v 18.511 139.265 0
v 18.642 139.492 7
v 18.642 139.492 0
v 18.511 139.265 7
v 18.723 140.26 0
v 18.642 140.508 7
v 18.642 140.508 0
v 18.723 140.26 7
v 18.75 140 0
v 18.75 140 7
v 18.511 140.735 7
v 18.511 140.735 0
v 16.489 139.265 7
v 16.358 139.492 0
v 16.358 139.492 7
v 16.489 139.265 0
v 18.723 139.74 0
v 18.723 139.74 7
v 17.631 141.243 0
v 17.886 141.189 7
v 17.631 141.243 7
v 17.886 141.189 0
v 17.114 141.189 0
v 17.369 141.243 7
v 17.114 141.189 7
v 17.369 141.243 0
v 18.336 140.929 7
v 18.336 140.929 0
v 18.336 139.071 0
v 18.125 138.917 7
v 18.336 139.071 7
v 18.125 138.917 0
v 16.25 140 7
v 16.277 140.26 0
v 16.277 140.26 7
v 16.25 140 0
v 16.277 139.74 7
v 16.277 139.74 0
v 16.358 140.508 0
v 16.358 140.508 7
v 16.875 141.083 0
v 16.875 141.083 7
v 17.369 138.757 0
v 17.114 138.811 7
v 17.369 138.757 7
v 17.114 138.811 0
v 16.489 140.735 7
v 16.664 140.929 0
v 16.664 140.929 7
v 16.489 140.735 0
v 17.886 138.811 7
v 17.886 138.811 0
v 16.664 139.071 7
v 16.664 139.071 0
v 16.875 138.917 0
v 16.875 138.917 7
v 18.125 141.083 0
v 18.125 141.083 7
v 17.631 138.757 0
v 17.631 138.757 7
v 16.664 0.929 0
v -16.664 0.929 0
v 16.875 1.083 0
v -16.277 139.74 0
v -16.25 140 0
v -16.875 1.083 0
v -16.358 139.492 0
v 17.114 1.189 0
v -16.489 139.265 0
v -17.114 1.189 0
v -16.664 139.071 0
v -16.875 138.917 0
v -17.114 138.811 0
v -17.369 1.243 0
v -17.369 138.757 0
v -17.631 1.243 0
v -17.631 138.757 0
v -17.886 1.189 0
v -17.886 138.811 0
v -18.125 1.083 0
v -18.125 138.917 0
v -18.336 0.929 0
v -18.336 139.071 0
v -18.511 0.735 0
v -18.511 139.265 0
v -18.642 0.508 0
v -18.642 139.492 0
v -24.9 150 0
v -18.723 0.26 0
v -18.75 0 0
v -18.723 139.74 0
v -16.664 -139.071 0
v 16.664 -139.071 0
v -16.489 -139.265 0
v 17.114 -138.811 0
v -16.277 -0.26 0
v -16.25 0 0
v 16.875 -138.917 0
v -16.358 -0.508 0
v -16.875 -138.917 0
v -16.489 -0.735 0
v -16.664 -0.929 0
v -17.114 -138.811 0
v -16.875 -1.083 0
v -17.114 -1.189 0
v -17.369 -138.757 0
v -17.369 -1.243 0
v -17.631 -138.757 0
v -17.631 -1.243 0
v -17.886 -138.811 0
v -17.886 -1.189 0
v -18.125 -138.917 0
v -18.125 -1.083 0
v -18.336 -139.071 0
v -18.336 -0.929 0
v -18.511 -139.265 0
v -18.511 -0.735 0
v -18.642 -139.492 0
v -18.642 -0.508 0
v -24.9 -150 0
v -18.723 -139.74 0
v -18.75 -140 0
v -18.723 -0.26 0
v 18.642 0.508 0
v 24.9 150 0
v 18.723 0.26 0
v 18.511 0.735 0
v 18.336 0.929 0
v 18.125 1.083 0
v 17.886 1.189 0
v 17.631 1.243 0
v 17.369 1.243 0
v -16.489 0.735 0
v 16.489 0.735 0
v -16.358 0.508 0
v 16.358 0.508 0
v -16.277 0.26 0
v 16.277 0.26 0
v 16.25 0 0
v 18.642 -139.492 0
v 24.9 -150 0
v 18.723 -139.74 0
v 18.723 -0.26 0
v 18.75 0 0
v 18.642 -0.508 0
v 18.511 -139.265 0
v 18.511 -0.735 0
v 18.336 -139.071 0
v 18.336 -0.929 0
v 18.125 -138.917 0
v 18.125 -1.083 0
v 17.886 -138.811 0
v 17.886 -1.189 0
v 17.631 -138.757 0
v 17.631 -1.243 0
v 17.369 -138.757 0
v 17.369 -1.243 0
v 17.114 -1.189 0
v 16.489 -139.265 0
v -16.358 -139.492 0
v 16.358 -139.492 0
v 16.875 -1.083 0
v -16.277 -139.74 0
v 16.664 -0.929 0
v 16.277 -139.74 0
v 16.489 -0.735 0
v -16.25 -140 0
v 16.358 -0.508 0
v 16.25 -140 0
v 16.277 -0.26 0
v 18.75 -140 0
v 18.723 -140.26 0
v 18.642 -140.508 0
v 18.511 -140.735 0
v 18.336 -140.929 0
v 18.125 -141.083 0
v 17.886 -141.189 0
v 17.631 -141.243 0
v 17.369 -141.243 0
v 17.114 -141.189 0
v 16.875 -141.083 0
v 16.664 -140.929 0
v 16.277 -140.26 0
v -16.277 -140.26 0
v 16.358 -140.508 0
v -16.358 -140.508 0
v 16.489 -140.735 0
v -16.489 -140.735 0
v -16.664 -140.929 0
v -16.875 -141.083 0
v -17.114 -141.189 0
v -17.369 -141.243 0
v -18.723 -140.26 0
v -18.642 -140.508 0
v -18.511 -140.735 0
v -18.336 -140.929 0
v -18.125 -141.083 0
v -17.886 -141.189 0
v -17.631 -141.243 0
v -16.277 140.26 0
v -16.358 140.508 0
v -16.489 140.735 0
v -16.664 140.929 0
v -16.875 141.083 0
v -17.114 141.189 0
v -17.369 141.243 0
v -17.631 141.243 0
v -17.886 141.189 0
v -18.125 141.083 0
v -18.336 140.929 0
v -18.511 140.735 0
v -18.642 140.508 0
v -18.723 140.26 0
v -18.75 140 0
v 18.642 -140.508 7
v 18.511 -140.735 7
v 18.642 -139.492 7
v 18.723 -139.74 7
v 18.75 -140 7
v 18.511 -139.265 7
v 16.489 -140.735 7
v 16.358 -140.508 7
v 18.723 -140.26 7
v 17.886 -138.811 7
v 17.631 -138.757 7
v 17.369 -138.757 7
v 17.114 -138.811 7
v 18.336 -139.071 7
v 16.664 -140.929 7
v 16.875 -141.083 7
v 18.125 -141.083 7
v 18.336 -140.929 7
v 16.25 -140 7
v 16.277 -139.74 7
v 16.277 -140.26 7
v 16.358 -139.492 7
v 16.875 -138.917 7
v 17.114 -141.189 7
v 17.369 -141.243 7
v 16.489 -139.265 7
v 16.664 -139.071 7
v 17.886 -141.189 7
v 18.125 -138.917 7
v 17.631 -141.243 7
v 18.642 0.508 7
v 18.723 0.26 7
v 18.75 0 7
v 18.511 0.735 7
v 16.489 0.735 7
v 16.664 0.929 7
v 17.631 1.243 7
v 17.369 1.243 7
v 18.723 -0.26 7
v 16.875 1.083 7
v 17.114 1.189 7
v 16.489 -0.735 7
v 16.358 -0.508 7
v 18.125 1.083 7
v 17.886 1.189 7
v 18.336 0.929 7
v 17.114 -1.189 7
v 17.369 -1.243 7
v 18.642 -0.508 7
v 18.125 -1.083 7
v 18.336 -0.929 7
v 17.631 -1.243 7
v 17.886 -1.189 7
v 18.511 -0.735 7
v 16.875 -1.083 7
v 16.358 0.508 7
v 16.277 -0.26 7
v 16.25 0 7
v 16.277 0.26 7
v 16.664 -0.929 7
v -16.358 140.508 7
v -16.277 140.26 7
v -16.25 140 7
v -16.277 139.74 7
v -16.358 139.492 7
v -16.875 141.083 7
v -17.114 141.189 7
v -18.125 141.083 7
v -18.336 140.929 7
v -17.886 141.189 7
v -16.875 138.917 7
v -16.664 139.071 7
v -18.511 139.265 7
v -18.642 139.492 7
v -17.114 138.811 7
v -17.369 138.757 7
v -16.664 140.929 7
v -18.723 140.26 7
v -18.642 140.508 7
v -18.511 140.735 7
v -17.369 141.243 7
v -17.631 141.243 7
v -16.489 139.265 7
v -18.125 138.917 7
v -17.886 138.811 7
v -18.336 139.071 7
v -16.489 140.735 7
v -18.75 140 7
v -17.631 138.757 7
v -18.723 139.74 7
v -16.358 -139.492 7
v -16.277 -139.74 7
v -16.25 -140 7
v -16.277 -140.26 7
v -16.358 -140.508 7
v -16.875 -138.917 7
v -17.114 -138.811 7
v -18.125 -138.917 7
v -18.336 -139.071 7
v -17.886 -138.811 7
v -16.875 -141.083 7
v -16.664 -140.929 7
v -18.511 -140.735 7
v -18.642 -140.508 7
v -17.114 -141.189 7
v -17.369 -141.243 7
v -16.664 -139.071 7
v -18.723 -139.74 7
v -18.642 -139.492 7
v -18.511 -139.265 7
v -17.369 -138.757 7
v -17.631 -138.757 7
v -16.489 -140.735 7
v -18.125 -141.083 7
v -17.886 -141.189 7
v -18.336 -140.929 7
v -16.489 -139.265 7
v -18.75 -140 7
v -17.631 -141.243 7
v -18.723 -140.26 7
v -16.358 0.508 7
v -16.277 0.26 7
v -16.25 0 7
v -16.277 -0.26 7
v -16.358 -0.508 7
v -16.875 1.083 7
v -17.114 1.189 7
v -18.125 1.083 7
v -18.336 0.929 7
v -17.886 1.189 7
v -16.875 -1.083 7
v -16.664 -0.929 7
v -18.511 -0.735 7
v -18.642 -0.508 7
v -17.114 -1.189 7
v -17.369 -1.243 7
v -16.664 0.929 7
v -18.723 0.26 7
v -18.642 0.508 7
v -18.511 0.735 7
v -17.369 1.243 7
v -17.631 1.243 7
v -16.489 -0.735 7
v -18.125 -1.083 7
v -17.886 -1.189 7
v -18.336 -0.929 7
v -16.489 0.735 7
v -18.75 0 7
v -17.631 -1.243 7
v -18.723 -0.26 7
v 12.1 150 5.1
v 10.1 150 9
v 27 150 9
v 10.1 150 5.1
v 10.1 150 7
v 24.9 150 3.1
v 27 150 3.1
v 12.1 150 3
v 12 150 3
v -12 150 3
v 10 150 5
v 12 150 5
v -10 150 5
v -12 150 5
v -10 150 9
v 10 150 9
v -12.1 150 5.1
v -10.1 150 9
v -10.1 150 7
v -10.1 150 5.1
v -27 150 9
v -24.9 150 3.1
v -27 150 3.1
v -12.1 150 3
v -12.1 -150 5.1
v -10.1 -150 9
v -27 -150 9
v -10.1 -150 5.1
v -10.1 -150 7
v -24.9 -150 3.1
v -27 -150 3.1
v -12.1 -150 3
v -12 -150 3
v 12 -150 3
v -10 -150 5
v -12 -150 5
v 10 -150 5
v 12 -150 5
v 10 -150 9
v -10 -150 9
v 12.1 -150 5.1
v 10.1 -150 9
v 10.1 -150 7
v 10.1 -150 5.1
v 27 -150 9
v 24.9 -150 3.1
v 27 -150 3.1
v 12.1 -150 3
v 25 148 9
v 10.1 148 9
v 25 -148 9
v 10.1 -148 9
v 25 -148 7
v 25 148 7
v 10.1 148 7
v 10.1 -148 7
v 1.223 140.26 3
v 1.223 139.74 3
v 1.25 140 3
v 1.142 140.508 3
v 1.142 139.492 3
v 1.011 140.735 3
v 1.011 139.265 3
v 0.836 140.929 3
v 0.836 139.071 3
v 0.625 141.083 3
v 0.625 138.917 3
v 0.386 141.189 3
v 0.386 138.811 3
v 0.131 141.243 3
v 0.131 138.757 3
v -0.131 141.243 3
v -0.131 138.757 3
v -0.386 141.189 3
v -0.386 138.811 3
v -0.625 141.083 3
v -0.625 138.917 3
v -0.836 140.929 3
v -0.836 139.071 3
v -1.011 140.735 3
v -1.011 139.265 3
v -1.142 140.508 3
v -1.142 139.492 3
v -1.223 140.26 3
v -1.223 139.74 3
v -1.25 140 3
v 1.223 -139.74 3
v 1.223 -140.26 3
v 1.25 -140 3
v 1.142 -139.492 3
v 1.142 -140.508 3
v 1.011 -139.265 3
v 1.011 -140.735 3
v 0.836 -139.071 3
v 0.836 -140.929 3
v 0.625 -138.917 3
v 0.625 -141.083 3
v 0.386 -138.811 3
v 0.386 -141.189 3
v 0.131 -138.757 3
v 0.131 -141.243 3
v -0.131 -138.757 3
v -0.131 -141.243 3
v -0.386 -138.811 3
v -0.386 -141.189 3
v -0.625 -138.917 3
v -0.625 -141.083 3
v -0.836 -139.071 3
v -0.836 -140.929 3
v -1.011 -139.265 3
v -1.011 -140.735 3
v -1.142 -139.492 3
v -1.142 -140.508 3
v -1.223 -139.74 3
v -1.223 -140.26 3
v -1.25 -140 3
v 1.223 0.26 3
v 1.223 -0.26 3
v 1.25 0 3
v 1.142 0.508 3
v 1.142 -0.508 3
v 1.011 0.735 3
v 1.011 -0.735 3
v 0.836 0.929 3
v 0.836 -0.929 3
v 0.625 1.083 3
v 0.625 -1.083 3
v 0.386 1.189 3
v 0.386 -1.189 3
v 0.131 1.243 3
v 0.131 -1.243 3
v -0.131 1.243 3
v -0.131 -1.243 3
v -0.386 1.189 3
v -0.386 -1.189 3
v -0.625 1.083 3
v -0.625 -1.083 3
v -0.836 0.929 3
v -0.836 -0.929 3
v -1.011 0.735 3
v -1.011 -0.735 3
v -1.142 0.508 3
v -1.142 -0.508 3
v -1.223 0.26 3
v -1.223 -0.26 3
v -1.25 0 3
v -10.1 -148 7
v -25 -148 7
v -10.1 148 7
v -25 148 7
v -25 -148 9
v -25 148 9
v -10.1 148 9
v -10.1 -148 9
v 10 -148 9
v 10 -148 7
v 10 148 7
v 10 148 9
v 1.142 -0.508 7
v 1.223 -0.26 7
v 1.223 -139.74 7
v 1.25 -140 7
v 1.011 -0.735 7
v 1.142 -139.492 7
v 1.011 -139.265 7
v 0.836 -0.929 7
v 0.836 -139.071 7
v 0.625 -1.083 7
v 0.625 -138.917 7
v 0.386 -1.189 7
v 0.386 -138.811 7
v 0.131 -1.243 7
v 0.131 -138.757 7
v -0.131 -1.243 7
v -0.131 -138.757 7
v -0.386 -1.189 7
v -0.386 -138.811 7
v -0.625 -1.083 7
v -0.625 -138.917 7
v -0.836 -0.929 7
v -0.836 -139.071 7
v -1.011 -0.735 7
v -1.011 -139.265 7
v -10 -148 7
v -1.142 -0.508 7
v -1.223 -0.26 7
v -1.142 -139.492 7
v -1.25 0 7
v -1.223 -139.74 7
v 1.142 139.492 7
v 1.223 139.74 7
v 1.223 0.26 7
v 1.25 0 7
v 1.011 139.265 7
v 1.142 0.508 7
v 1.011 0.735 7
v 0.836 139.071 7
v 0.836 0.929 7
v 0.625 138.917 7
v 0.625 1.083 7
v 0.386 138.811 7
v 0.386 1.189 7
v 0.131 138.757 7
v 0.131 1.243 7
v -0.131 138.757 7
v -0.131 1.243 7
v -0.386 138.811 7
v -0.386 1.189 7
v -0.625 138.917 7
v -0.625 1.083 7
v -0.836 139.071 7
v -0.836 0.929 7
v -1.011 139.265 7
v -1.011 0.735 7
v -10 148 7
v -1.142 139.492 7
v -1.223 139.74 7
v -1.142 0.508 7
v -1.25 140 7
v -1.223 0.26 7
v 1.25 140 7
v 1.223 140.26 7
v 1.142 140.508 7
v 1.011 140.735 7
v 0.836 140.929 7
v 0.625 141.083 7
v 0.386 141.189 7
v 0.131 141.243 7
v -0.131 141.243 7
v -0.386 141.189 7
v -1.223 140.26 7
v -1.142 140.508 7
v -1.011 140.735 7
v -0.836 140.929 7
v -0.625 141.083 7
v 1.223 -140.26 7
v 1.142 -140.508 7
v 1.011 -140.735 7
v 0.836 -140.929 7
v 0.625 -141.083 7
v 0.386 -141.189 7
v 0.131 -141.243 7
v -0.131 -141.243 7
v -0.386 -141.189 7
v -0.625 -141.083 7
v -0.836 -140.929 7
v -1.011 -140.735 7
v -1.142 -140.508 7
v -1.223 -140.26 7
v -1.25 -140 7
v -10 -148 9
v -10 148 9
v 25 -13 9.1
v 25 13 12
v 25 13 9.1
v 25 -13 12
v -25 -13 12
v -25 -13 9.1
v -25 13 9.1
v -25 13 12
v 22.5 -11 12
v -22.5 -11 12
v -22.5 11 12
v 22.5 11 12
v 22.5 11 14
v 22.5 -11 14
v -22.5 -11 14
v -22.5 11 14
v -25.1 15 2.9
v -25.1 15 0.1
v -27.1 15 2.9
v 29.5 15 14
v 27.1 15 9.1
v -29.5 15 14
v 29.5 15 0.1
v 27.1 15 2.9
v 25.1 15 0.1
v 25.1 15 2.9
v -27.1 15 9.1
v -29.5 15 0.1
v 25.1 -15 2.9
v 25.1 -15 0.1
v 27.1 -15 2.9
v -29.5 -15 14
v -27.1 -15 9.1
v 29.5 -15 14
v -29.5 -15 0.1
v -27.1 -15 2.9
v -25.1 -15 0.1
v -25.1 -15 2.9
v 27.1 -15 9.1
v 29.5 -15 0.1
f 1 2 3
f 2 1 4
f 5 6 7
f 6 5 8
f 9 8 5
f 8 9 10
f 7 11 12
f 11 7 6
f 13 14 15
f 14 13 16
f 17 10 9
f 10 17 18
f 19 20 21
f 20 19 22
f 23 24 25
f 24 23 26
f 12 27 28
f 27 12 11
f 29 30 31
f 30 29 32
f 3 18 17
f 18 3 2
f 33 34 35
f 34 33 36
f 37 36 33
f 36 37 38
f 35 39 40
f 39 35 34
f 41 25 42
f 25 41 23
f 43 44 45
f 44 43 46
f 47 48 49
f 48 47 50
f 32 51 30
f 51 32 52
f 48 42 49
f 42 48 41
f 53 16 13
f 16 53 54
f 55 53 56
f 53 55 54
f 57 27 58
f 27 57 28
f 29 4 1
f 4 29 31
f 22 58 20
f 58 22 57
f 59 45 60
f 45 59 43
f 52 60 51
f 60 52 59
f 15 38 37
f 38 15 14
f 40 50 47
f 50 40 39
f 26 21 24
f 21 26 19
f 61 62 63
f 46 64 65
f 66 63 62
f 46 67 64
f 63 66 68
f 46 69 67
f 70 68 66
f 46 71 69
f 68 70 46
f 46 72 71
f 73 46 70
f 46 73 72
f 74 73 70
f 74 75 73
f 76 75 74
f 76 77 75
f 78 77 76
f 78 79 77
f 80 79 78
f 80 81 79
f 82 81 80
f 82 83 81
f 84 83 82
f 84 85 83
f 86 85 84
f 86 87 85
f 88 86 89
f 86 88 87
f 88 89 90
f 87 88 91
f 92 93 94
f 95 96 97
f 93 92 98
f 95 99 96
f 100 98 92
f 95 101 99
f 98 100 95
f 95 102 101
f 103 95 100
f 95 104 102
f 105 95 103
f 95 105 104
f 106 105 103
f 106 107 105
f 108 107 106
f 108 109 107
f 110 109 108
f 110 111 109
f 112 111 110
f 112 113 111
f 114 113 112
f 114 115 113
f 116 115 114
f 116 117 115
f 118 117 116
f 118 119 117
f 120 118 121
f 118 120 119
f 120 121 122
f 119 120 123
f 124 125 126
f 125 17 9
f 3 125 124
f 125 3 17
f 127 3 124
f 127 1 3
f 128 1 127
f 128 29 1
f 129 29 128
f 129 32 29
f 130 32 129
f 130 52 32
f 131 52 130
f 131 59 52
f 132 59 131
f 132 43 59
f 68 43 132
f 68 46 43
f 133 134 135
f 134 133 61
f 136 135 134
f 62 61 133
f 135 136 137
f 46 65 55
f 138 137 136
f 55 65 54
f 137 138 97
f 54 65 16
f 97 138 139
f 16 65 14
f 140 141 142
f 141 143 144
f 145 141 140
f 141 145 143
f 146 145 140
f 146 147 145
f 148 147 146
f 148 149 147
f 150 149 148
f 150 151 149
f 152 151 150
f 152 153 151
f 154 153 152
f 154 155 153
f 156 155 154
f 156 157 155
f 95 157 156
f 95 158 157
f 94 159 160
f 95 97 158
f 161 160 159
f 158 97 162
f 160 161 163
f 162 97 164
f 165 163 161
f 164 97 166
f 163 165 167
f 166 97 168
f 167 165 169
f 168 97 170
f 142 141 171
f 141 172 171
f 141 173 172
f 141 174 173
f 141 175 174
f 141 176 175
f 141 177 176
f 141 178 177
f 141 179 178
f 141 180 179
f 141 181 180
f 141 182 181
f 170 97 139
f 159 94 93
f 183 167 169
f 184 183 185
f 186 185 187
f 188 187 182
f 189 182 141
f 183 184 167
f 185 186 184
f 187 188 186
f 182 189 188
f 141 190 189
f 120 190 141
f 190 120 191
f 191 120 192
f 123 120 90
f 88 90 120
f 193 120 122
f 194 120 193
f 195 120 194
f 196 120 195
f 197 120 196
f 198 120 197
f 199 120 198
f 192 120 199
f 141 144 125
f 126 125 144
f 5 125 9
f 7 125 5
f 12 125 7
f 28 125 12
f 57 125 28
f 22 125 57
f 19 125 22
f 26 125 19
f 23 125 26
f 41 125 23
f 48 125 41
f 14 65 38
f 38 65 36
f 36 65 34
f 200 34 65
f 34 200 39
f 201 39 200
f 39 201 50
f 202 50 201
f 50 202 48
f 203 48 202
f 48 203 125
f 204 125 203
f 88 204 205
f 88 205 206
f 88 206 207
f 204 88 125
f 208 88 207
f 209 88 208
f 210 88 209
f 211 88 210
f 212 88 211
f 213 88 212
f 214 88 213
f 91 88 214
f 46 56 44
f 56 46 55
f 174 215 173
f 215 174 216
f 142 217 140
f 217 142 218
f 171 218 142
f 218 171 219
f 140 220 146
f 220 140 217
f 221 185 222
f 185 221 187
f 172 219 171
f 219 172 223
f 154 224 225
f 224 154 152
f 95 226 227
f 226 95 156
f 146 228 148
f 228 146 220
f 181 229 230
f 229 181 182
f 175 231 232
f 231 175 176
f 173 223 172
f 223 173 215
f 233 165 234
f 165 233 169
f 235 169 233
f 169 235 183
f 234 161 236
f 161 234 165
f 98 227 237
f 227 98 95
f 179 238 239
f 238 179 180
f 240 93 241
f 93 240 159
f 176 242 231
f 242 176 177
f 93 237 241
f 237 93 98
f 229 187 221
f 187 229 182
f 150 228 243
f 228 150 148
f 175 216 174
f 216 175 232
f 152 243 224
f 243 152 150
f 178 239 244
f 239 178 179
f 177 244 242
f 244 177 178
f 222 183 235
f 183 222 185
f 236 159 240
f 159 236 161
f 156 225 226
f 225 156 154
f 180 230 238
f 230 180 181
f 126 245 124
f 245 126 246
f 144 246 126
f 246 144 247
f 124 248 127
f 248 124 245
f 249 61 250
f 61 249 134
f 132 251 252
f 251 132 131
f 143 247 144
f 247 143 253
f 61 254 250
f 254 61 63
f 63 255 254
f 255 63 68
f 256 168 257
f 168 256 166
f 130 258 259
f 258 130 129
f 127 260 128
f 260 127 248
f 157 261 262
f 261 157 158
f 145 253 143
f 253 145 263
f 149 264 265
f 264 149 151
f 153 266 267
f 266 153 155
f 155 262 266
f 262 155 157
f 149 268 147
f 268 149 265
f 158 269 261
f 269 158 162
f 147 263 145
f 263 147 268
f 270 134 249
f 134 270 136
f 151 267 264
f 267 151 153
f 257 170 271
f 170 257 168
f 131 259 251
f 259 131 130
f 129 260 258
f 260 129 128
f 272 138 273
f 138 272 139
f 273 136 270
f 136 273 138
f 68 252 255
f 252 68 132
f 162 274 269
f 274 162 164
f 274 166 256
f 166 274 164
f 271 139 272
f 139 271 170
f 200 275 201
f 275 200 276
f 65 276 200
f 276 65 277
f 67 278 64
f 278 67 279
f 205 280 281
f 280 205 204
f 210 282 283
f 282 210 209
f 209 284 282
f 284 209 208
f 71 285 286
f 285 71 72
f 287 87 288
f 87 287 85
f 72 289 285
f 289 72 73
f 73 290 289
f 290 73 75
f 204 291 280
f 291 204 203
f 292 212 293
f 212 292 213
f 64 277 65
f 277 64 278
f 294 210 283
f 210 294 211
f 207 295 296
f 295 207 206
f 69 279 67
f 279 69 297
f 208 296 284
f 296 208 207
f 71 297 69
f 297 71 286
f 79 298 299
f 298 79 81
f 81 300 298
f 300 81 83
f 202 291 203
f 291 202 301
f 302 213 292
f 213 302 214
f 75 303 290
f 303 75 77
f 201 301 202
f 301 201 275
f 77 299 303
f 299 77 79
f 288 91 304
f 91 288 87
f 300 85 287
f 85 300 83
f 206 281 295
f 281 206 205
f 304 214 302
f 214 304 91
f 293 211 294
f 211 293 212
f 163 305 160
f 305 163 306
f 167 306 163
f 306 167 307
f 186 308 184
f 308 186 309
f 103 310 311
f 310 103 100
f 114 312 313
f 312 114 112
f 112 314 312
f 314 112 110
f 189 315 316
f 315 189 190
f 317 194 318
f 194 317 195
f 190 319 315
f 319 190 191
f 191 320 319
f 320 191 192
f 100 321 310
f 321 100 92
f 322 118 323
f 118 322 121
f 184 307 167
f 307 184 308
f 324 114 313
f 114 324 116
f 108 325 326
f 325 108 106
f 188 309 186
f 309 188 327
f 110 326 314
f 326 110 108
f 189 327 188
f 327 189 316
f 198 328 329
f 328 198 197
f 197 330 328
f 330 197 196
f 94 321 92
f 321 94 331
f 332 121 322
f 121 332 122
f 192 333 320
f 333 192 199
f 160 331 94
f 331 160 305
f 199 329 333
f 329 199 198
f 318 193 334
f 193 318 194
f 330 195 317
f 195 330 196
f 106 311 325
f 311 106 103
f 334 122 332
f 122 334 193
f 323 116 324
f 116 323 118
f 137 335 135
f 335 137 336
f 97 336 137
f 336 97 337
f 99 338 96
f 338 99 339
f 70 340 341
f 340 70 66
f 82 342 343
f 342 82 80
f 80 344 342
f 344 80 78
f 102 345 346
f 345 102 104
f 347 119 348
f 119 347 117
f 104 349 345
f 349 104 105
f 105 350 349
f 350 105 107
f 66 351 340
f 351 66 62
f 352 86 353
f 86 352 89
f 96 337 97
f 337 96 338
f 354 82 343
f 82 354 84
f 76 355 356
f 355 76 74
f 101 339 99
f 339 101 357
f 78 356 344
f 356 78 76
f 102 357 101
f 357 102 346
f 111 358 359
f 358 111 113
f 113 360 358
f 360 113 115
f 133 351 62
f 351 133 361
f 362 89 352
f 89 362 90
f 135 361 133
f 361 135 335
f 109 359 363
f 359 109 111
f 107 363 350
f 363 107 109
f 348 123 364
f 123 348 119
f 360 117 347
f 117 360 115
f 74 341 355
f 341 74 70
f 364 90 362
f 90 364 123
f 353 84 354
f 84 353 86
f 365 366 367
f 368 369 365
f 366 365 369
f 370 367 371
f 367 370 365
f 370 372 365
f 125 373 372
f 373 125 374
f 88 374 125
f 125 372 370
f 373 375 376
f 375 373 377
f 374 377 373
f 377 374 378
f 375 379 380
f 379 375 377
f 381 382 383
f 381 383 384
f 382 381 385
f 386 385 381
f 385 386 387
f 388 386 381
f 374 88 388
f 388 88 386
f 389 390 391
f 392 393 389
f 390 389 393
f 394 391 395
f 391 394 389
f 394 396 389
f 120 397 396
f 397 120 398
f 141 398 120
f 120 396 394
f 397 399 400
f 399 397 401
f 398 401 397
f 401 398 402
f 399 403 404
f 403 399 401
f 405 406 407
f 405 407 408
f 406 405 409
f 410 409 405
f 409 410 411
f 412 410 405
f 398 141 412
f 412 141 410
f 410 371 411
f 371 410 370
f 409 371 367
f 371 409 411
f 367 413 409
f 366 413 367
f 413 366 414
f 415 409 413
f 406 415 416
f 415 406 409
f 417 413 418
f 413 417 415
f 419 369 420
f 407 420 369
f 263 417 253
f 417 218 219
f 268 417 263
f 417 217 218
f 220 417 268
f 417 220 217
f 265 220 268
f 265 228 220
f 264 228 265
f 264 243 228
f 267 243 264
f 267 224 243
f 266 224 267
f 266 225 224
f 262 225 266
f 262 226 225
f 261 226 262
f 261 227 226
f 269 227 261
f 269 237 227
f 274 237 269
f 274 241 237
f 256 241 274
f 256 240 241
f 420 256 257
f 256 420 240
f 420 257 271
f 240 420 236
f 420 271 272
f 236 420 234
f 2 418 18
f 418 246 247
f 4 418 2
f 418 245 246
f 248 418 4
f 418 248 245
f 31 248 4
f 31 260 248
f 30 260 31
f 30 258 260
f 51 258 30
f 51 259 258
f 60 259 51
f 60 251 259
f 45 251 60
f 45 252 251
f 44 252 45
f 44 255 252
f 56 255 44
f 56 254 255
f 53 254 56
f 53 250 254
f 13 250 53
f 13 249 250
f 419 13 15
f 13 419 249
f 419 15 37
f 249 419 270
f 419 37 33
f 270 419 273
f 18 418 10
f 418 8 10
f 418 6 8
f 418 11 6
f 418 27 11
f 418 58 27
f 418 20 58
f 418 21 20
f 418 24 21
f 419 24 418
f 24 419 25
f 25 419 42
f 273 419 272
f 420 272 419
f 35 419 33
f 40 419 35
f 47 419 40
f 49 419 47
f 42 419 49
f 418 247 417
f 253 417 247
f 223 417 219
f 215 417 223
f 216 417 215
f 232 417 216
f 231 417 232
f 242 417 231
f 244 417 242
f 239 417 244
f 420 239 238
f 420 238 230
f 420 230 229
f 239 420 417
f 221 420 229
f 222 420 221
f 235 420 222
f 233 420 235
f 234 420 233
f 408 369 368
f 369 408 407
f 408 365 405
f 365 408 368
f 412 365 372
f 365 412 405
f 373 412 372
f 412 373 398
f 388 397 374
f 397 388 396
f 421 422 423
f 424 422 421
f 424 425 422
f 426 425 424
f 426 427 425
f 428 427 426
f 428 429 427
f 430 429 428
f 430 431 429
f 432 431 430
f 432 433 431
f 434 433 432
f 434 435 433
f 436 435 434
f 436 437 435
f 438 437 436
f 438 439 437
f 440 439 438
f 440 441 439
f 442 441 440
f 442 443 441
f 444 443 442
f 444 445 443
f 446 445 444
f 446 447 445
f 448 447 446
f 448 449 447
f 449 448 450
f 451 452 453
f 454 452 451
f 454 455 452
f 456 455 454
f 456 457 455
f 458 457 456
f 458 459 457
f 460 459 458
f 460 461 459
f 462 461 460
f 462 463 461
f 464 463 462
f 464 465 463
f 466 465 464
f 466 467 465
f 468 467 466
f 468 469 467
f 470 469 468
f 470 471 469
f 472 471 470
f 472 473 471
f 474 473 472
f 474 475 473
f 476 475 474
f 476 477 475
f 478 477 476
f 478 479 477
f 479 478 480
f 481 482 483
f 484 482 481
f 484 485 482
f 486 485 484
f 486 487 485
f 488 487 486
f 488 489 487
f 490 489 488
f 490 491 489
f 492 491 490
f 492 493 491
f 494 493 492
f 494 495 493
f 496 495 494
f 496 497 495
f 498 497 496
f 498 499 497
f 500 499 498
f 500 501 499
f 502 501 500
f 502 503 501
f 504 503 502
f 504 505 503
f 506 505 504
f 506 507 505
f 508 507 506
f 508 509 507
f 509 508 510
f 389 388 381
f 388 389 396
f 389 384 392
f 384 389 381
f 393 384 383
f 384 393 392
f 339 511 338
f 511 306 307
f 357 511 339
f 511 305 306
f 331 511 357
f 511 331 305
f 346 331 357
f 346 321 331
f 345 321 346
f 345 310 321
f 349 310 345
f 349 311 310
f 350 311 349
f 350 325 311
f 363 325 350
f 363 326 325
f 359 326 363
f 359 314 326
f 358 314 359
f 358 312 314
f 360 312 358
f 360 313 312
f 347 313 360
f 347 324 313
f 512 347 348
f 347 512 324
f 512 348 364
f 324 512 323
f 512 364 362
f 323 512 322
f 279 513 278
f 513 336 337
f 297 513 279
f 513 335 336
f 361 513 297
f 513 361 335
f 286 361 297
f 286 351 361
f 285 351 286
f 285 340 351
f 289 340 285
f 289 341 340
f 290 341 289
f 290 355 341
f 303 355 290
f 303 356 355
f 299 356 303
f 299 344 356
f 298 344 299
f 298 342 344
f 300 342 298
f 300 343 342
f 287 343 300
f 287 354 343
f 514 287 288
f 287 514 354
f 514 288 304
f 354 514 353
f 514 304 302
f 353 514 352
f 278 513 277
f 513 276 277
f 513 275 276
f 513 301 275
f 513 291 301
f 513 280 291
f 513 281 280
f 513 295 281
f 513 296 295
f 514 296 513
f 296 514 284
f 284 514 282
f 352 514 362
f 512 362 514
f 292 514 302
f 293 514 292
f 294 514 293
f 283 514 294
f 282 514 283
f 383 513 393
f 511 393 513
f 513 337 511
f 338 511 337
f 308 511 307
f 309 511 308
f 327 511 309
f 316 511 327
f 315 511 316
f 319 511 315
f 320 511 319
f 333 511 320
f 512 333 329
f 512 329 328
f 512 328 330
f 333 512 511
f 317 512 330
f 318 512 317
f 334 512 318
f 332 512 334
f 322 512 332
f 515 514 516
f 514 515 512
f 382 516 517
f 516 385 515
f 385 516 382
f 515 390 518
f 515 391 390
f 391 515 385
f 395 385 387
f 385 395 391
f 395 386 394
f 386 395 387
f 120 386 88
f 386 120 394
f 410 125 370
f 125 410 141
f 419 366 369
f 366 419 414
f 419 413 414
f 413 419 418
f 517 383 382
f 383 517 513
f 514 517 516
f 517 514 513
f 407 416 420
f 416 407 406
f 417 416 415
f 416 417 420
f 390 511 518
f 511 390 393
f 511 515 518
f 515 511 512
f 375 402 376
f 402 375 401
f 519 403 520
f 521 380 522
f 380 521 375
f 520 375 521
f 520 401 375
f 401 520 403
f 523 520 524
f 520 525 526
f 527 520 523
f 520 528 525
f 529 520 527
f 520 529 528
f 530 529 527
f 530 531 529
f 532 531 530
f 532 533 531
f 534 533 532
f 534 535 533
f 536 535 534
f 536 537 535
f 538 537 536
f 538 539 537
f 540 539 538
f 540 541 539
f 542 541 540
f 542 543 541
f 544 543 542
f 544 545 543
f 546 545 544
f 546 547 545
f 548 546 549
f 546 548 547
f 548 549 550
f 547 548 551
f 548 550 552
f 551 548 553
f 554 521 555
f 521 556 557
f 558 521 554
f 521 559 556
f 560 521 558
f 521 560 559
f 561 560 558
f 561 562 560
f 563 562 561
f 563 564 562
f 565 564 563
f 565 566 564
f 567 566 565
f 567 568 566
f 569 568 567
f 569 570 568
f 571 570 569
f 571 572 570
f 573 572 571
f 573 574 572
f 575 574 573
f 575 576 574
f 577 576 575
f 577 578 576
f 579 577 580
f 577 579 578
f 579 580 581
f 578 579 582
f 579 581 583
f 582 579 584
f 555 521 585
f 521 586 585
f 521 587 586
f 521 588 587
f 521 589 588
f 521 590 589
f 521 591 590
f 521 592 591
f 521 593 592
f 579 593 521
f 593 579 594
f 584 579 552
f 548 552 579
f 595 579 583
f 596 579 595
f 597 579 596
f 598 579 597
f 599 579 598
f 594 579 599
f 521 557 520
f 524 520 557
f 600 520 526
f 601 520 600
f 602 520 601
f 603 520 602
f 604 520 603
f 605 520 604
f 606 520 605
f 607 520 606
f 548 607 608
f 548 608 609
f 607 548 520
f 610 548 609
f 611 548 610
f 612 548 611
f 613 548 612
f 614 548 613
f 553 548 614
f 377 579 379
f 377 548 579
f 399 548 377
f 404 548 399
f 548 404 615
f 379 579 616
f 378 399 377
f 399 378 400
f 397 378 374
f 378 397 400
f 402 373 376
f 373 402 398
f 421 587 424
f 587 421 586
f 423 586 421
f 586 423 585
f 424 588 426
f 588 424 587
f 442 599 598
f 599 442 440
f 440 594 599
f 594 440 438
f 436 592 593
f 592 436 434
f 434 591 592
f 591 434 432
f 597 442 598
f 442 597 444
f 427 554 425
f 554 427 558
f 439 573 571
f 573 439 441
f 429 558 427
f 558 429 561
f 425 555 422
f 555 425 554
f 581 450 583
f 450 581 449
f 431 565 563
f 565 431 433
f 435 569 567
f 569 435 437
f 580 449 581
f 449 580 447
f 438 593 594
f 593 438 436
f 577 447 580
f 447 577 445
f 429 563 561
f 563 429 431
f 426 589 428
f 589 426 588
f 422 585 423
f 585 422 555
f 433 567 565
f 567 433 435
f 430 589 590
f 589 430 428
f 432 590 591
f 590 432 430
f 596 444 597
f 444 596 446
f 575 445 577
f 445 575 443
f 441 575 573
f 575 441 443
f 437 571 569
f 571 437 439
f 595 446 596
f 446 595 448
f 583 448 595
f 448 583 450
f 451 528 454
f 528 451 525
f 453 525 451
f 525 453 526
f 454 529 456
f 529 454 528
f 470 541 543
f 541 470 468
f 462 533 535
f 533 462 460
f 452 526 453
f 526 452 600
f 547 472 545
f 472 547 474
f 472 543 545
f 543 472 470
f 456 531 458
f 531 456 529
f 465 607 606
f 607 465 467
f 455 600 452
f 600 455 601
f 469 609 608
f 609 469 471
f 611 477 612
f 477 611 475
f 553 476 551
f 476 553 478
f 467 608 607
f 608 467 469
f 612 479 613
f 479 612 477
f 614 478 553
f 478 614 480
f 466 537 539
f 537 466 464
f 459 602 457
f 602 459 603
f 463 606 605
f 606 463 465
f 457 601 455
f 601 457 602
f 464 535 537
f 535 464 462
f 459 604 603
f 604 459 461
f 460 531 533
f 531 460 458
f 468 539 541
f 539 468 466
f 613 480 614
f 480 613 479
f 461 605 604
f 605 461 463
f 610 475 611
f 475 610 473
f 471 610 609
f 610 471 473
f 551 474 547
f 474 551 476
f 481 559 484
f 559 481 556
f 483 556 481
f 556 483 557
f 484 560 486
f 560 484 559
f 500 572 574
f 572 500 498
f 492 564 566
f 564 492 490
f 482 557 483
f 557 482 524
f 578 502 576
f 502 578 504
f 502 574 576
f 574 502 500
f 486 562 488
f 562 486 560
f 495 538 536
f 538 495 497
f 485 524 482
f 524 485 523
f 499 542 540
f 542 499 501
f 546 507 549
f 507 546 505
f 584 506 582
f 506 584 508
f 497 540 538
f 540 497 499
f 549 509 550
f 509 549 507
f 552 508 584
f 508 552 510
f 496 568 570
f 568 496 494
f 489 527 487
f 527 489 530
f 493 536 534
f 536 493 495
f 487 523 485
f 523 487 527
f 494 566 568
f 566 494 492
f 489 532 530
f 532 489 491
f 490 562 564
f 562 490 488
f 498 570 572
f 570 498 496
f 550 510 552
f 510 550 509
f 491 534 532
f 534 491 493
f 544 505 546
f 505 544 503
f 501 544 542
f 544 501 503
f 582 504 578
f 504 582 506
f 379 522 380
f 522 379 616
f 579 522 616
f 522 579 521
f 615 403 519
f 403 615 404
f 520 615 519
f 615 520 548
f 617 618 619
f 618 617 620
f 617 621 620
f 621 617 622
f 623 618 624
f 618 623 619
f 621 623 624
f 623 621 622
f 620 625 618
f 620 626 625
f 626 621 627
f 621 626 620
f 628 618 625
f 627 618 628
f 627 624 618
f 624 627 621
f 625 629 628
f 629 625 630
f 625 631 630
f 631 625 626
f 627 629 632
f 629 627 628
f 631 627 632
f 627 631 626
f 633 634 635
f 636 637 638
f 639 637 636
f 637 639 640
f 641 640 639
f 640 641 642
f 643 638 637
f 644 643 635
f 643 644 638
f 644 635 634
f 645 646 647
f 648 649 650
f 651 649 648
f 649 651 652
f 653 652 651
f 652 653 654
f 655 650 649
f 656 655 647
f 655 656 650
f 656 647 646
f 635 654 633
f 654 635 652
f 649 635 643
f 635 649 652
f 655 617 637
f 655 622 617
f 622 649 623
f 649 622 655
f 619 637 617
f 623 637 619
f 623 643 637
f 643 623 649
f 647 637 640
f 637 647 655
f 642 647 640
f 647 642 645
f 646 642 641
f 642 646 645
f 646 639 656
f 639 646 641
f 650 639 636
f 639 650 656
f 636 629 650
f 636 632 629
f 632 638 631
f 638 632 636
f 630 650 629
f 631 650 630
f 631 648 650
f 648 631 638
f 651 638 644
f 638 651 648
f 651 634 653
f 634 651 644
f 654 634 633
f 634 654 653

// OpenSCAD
$fn = 30;

body_thickness = 7;
rule_thickness = 4;
label_thickness = 2;
rule_width = 20;
body_label_width = 15;
length = 300;
window_claw_h = 3;
window_claw_w = 2;
key_len = 2;
key_width = 2;
tol = 0.1;
window_height = body_thickness + key_len + 5;
window_width = body_label_width * 2 + key_len * 2 + rule_width + 5;
window_length = 30;
transparent_window_width = body_label_width * 2 + rule_width;
transparent_window_len = window_length - 4;
transparent_window_thickness = 3;
transparent_window_width1 = body_label_width * 2 + rule_width - 5;
transparent_window_len1 = window_length - 4 - 4;
screw_hole_end_sep = 10;

module body()
{
	difference()
	{
		rotate([ 90, 0, 0 ])
		translate([ 0, 0, -length / 2 ])
		{
			linear_extrude(length)
			{
				polygon(points = [

					[ rule_width / 2 + key_len + tol, body_thickness - rule_thickness ],
					[ rule_width / 2 + key_len + tol, body_thickness - rule_thickness + key_width + tol ],        // 7
					[ rule_width / 2 + tol, body_thickness - rule_thickness + key_width + tol ],                  // 6
					[ rule_width / 2 + tol, body_thickness ],                                                     // 5
					[ rule_width / 2 + body_label_width, body_thickness ],                                        // 4
					[ rule_width / 2 + body_label_width, body_thickness + label_thickness ],                      // 3
					[ rule_width / 2 + body_label_width + key_width, body_thickness + label_thickness ],          // 2
					[ rule_width / 2 + body_label_width + key_width, window_claw_h + tol ],                       // 1
					[ rule_width / 2 + body_label_width + key_width - window_claw_w - tol, window_claw_h + tol ], // 1
					[ rule_width / 2 + body_label_width + key_width - window_claw_w - tol, 0 ],                   // 1

					[ -rule_width / 2 - body_label_width - key_width + window_claw_w + tol, 0 ],                   // 1
					[ -rule_width / 2 - body_label_width - key_width + window_claw_w + tol, window_claw_h + tol ], // 1
					[ -rule_width / 2 - body_label_width - key_width, window_claw_h + tol ],                       // 1
					[ -rule_width / 2 - body_label_width - key_width, body_thickness + label_thickness ],          // 2
					[ -rule_width / 2 - body_label_width, body_thickness + label_thickness ],                      // 3
					[ -rule_width / 2 - body_label_width, body_thickness ],                                        // 4
					[ -rule_width / 2 - tol, body_thickness ],                                                     // 5
					[ -rule_width / 2 - tol, body_thickness - rule_thickness + key_width + tol ],                  // 6
					[ -rule_width / 2 - tol - key_len, body_thickness - rule_thickness + key_width + tol ],        // 7
					[ -rule_width / 2 - tol - key_len, body_thickness - rule_thickness ],                          // 8
				]);
			}
		}
		for (x = [ rule_width/2+body_label_width/2, -rule_width/2-body_label_width/2 ])
		{
			translate([ x, length / 2 - screw_hole_end_sep, 0 ])
			cylinder(h = body_thickness + tol, d = 2.5);
			translate([ x, -(length / 2 - screw_hole_end_sep), 0 ])
			cylinder(h = body_thickness + tol, d = 2.5);
			translate([ x, 0, 0 ])
			cylinder(h = body_thickness + tol, d = 2.5);
		}
	}

	translate([rule_width/2+tol,length/2-label_thickness,body_thickness])
	cube([body_label_width,key_width, label_thickness]);

	translate([-rule_width/2-body_label_width-tol,length/2-label_thickness,body_thickness])
	cube([body_label_width,key_width, label_thickness]);

	translate([rule_width/2+tol,-length/2-label_thickness+key_width,body_thickness])
	cube([body_label_width,key_width, label_thickness]);

	translate([-rule_width/2-body_label_width-tol,-length/2-label_thickness+key_width,body_thickness])
	cube([body_label_width,key_width, label_thickness]);
}

module rule()
{
	difference()
	{
		rotate([ 90, 0, 0 ])
		translate([ 0, 0, -length / 2 ])
		{

			linear_extrude(length)
			{
				polygon(points = [
					[ 0, body_thickness ], [ rule_width / 2, body_thickness ],                    // 4
					[ rule_width / 2, body_thickness - rule_thickness + key_width ],              // 3
					[ rule_width / 2 + key_len, body_thickness - rule_thickness + key_width ],    // 2
					[ rule_width / 2 + key_len, body_thickness - rule_thickness ],                // 1
					[ -(rule_width / 2 + key_len), body_thickness - rule_thickness ],             // 1
					[ -(rule_width / 2 + key_len), body_thickness - rule_thickness + key_width ], // 2
					[ -(rule_width / 2), body_thickness - rule_thickness + key_width ],           // 3
					[ -rule_width / 2, body_thickness ],                                          // 4
				]);
			}
		}
		translate([ 0, length / 2 - screw_hole_end_sep, 0 ])
		cylinder(h = body_thickness + tol, d = 2.5);
		translate([ 0, -(length / 2 - screw_hole_end_sep), 0 ])
		cylinder(h = body_thickness + tol, d = 2.5);
		translate([ 0, 0, 0 ])
		cylinder(h = body_thickness + tol, d = 2.5);
	}
	translate([-rule_width/2,length/2-key_width, body_thickness])
	#cube([rule_width,key_width, label_thickness]);

	translate([-rule_width/2,-length/2, body_thickness])
	cube([rule_width,key_width, label_thickness]);
}

module window()
{
	rotate([ 90, 0, 0 ])
	difference()
	{
		translate([ 0, 0, -window_length / 2 ])
		{
			linear_extrude(window_length)
			{
				polygon(points = [
					//[0,body_thickness+key_len+tol],
					[ rule_width / 2 + body_label_width + key_width + tol, body_thickness + key_len + tol ],      // 6
					[ rule_width / 2 + body_label_width + key_width + tol, window_claw_h - tol ],                 // 5
					[ rule_width / 2 + body_label_width + key_width - window_claw_w + tol, window_claw_h - tol ], // 4
					[ rule_width / 2 + body_label_width + key_width - window_claw_w + tol, tol ],                 // 3
					[ window_width / 2, tol ],                                                                    // 2
					[ window_width / 2, window_height ],                                                          // 1
					[ -window_width / 2, window_height ],                                                         // 1
					[ -window_width / 2, tol ],                                                                   // 2
					[ -rule_width / 2 - body_label_width - key_width + window_claw_w - tol, tol ],                // 3
					[
						-(rule_width / 2 + body_label_width + key_width - window_claw_w + tol), window_claw_h - tol
					],                                                                                          // 4
					[ -(rule_width / 2 + body_label_width + key_width + tol), window_claw_h - tol ],            // 5
					[ -(rule_width / 2 + body_label_width + key_width + tol), body_thickness + key_len + tol ], // 6
				]);
			}
		}
		translate([ 0, body_thickness + key_len ])
		union()
		{
			translate([ 0, transparent_window_thickness / 2, 0 ])
			cube(size = [ transparent_window_width, transparent_window_thickness, transparent_window_len ],
			     center = true);
			translate([ -transparent_window_width1 / 2, 0, -transparent_window_len1 / 2 ])
			cube(size = [ transparent_window_width1, 100, transparent_window_len1 ]);
		}
	}
}

body();
rule();
window();
